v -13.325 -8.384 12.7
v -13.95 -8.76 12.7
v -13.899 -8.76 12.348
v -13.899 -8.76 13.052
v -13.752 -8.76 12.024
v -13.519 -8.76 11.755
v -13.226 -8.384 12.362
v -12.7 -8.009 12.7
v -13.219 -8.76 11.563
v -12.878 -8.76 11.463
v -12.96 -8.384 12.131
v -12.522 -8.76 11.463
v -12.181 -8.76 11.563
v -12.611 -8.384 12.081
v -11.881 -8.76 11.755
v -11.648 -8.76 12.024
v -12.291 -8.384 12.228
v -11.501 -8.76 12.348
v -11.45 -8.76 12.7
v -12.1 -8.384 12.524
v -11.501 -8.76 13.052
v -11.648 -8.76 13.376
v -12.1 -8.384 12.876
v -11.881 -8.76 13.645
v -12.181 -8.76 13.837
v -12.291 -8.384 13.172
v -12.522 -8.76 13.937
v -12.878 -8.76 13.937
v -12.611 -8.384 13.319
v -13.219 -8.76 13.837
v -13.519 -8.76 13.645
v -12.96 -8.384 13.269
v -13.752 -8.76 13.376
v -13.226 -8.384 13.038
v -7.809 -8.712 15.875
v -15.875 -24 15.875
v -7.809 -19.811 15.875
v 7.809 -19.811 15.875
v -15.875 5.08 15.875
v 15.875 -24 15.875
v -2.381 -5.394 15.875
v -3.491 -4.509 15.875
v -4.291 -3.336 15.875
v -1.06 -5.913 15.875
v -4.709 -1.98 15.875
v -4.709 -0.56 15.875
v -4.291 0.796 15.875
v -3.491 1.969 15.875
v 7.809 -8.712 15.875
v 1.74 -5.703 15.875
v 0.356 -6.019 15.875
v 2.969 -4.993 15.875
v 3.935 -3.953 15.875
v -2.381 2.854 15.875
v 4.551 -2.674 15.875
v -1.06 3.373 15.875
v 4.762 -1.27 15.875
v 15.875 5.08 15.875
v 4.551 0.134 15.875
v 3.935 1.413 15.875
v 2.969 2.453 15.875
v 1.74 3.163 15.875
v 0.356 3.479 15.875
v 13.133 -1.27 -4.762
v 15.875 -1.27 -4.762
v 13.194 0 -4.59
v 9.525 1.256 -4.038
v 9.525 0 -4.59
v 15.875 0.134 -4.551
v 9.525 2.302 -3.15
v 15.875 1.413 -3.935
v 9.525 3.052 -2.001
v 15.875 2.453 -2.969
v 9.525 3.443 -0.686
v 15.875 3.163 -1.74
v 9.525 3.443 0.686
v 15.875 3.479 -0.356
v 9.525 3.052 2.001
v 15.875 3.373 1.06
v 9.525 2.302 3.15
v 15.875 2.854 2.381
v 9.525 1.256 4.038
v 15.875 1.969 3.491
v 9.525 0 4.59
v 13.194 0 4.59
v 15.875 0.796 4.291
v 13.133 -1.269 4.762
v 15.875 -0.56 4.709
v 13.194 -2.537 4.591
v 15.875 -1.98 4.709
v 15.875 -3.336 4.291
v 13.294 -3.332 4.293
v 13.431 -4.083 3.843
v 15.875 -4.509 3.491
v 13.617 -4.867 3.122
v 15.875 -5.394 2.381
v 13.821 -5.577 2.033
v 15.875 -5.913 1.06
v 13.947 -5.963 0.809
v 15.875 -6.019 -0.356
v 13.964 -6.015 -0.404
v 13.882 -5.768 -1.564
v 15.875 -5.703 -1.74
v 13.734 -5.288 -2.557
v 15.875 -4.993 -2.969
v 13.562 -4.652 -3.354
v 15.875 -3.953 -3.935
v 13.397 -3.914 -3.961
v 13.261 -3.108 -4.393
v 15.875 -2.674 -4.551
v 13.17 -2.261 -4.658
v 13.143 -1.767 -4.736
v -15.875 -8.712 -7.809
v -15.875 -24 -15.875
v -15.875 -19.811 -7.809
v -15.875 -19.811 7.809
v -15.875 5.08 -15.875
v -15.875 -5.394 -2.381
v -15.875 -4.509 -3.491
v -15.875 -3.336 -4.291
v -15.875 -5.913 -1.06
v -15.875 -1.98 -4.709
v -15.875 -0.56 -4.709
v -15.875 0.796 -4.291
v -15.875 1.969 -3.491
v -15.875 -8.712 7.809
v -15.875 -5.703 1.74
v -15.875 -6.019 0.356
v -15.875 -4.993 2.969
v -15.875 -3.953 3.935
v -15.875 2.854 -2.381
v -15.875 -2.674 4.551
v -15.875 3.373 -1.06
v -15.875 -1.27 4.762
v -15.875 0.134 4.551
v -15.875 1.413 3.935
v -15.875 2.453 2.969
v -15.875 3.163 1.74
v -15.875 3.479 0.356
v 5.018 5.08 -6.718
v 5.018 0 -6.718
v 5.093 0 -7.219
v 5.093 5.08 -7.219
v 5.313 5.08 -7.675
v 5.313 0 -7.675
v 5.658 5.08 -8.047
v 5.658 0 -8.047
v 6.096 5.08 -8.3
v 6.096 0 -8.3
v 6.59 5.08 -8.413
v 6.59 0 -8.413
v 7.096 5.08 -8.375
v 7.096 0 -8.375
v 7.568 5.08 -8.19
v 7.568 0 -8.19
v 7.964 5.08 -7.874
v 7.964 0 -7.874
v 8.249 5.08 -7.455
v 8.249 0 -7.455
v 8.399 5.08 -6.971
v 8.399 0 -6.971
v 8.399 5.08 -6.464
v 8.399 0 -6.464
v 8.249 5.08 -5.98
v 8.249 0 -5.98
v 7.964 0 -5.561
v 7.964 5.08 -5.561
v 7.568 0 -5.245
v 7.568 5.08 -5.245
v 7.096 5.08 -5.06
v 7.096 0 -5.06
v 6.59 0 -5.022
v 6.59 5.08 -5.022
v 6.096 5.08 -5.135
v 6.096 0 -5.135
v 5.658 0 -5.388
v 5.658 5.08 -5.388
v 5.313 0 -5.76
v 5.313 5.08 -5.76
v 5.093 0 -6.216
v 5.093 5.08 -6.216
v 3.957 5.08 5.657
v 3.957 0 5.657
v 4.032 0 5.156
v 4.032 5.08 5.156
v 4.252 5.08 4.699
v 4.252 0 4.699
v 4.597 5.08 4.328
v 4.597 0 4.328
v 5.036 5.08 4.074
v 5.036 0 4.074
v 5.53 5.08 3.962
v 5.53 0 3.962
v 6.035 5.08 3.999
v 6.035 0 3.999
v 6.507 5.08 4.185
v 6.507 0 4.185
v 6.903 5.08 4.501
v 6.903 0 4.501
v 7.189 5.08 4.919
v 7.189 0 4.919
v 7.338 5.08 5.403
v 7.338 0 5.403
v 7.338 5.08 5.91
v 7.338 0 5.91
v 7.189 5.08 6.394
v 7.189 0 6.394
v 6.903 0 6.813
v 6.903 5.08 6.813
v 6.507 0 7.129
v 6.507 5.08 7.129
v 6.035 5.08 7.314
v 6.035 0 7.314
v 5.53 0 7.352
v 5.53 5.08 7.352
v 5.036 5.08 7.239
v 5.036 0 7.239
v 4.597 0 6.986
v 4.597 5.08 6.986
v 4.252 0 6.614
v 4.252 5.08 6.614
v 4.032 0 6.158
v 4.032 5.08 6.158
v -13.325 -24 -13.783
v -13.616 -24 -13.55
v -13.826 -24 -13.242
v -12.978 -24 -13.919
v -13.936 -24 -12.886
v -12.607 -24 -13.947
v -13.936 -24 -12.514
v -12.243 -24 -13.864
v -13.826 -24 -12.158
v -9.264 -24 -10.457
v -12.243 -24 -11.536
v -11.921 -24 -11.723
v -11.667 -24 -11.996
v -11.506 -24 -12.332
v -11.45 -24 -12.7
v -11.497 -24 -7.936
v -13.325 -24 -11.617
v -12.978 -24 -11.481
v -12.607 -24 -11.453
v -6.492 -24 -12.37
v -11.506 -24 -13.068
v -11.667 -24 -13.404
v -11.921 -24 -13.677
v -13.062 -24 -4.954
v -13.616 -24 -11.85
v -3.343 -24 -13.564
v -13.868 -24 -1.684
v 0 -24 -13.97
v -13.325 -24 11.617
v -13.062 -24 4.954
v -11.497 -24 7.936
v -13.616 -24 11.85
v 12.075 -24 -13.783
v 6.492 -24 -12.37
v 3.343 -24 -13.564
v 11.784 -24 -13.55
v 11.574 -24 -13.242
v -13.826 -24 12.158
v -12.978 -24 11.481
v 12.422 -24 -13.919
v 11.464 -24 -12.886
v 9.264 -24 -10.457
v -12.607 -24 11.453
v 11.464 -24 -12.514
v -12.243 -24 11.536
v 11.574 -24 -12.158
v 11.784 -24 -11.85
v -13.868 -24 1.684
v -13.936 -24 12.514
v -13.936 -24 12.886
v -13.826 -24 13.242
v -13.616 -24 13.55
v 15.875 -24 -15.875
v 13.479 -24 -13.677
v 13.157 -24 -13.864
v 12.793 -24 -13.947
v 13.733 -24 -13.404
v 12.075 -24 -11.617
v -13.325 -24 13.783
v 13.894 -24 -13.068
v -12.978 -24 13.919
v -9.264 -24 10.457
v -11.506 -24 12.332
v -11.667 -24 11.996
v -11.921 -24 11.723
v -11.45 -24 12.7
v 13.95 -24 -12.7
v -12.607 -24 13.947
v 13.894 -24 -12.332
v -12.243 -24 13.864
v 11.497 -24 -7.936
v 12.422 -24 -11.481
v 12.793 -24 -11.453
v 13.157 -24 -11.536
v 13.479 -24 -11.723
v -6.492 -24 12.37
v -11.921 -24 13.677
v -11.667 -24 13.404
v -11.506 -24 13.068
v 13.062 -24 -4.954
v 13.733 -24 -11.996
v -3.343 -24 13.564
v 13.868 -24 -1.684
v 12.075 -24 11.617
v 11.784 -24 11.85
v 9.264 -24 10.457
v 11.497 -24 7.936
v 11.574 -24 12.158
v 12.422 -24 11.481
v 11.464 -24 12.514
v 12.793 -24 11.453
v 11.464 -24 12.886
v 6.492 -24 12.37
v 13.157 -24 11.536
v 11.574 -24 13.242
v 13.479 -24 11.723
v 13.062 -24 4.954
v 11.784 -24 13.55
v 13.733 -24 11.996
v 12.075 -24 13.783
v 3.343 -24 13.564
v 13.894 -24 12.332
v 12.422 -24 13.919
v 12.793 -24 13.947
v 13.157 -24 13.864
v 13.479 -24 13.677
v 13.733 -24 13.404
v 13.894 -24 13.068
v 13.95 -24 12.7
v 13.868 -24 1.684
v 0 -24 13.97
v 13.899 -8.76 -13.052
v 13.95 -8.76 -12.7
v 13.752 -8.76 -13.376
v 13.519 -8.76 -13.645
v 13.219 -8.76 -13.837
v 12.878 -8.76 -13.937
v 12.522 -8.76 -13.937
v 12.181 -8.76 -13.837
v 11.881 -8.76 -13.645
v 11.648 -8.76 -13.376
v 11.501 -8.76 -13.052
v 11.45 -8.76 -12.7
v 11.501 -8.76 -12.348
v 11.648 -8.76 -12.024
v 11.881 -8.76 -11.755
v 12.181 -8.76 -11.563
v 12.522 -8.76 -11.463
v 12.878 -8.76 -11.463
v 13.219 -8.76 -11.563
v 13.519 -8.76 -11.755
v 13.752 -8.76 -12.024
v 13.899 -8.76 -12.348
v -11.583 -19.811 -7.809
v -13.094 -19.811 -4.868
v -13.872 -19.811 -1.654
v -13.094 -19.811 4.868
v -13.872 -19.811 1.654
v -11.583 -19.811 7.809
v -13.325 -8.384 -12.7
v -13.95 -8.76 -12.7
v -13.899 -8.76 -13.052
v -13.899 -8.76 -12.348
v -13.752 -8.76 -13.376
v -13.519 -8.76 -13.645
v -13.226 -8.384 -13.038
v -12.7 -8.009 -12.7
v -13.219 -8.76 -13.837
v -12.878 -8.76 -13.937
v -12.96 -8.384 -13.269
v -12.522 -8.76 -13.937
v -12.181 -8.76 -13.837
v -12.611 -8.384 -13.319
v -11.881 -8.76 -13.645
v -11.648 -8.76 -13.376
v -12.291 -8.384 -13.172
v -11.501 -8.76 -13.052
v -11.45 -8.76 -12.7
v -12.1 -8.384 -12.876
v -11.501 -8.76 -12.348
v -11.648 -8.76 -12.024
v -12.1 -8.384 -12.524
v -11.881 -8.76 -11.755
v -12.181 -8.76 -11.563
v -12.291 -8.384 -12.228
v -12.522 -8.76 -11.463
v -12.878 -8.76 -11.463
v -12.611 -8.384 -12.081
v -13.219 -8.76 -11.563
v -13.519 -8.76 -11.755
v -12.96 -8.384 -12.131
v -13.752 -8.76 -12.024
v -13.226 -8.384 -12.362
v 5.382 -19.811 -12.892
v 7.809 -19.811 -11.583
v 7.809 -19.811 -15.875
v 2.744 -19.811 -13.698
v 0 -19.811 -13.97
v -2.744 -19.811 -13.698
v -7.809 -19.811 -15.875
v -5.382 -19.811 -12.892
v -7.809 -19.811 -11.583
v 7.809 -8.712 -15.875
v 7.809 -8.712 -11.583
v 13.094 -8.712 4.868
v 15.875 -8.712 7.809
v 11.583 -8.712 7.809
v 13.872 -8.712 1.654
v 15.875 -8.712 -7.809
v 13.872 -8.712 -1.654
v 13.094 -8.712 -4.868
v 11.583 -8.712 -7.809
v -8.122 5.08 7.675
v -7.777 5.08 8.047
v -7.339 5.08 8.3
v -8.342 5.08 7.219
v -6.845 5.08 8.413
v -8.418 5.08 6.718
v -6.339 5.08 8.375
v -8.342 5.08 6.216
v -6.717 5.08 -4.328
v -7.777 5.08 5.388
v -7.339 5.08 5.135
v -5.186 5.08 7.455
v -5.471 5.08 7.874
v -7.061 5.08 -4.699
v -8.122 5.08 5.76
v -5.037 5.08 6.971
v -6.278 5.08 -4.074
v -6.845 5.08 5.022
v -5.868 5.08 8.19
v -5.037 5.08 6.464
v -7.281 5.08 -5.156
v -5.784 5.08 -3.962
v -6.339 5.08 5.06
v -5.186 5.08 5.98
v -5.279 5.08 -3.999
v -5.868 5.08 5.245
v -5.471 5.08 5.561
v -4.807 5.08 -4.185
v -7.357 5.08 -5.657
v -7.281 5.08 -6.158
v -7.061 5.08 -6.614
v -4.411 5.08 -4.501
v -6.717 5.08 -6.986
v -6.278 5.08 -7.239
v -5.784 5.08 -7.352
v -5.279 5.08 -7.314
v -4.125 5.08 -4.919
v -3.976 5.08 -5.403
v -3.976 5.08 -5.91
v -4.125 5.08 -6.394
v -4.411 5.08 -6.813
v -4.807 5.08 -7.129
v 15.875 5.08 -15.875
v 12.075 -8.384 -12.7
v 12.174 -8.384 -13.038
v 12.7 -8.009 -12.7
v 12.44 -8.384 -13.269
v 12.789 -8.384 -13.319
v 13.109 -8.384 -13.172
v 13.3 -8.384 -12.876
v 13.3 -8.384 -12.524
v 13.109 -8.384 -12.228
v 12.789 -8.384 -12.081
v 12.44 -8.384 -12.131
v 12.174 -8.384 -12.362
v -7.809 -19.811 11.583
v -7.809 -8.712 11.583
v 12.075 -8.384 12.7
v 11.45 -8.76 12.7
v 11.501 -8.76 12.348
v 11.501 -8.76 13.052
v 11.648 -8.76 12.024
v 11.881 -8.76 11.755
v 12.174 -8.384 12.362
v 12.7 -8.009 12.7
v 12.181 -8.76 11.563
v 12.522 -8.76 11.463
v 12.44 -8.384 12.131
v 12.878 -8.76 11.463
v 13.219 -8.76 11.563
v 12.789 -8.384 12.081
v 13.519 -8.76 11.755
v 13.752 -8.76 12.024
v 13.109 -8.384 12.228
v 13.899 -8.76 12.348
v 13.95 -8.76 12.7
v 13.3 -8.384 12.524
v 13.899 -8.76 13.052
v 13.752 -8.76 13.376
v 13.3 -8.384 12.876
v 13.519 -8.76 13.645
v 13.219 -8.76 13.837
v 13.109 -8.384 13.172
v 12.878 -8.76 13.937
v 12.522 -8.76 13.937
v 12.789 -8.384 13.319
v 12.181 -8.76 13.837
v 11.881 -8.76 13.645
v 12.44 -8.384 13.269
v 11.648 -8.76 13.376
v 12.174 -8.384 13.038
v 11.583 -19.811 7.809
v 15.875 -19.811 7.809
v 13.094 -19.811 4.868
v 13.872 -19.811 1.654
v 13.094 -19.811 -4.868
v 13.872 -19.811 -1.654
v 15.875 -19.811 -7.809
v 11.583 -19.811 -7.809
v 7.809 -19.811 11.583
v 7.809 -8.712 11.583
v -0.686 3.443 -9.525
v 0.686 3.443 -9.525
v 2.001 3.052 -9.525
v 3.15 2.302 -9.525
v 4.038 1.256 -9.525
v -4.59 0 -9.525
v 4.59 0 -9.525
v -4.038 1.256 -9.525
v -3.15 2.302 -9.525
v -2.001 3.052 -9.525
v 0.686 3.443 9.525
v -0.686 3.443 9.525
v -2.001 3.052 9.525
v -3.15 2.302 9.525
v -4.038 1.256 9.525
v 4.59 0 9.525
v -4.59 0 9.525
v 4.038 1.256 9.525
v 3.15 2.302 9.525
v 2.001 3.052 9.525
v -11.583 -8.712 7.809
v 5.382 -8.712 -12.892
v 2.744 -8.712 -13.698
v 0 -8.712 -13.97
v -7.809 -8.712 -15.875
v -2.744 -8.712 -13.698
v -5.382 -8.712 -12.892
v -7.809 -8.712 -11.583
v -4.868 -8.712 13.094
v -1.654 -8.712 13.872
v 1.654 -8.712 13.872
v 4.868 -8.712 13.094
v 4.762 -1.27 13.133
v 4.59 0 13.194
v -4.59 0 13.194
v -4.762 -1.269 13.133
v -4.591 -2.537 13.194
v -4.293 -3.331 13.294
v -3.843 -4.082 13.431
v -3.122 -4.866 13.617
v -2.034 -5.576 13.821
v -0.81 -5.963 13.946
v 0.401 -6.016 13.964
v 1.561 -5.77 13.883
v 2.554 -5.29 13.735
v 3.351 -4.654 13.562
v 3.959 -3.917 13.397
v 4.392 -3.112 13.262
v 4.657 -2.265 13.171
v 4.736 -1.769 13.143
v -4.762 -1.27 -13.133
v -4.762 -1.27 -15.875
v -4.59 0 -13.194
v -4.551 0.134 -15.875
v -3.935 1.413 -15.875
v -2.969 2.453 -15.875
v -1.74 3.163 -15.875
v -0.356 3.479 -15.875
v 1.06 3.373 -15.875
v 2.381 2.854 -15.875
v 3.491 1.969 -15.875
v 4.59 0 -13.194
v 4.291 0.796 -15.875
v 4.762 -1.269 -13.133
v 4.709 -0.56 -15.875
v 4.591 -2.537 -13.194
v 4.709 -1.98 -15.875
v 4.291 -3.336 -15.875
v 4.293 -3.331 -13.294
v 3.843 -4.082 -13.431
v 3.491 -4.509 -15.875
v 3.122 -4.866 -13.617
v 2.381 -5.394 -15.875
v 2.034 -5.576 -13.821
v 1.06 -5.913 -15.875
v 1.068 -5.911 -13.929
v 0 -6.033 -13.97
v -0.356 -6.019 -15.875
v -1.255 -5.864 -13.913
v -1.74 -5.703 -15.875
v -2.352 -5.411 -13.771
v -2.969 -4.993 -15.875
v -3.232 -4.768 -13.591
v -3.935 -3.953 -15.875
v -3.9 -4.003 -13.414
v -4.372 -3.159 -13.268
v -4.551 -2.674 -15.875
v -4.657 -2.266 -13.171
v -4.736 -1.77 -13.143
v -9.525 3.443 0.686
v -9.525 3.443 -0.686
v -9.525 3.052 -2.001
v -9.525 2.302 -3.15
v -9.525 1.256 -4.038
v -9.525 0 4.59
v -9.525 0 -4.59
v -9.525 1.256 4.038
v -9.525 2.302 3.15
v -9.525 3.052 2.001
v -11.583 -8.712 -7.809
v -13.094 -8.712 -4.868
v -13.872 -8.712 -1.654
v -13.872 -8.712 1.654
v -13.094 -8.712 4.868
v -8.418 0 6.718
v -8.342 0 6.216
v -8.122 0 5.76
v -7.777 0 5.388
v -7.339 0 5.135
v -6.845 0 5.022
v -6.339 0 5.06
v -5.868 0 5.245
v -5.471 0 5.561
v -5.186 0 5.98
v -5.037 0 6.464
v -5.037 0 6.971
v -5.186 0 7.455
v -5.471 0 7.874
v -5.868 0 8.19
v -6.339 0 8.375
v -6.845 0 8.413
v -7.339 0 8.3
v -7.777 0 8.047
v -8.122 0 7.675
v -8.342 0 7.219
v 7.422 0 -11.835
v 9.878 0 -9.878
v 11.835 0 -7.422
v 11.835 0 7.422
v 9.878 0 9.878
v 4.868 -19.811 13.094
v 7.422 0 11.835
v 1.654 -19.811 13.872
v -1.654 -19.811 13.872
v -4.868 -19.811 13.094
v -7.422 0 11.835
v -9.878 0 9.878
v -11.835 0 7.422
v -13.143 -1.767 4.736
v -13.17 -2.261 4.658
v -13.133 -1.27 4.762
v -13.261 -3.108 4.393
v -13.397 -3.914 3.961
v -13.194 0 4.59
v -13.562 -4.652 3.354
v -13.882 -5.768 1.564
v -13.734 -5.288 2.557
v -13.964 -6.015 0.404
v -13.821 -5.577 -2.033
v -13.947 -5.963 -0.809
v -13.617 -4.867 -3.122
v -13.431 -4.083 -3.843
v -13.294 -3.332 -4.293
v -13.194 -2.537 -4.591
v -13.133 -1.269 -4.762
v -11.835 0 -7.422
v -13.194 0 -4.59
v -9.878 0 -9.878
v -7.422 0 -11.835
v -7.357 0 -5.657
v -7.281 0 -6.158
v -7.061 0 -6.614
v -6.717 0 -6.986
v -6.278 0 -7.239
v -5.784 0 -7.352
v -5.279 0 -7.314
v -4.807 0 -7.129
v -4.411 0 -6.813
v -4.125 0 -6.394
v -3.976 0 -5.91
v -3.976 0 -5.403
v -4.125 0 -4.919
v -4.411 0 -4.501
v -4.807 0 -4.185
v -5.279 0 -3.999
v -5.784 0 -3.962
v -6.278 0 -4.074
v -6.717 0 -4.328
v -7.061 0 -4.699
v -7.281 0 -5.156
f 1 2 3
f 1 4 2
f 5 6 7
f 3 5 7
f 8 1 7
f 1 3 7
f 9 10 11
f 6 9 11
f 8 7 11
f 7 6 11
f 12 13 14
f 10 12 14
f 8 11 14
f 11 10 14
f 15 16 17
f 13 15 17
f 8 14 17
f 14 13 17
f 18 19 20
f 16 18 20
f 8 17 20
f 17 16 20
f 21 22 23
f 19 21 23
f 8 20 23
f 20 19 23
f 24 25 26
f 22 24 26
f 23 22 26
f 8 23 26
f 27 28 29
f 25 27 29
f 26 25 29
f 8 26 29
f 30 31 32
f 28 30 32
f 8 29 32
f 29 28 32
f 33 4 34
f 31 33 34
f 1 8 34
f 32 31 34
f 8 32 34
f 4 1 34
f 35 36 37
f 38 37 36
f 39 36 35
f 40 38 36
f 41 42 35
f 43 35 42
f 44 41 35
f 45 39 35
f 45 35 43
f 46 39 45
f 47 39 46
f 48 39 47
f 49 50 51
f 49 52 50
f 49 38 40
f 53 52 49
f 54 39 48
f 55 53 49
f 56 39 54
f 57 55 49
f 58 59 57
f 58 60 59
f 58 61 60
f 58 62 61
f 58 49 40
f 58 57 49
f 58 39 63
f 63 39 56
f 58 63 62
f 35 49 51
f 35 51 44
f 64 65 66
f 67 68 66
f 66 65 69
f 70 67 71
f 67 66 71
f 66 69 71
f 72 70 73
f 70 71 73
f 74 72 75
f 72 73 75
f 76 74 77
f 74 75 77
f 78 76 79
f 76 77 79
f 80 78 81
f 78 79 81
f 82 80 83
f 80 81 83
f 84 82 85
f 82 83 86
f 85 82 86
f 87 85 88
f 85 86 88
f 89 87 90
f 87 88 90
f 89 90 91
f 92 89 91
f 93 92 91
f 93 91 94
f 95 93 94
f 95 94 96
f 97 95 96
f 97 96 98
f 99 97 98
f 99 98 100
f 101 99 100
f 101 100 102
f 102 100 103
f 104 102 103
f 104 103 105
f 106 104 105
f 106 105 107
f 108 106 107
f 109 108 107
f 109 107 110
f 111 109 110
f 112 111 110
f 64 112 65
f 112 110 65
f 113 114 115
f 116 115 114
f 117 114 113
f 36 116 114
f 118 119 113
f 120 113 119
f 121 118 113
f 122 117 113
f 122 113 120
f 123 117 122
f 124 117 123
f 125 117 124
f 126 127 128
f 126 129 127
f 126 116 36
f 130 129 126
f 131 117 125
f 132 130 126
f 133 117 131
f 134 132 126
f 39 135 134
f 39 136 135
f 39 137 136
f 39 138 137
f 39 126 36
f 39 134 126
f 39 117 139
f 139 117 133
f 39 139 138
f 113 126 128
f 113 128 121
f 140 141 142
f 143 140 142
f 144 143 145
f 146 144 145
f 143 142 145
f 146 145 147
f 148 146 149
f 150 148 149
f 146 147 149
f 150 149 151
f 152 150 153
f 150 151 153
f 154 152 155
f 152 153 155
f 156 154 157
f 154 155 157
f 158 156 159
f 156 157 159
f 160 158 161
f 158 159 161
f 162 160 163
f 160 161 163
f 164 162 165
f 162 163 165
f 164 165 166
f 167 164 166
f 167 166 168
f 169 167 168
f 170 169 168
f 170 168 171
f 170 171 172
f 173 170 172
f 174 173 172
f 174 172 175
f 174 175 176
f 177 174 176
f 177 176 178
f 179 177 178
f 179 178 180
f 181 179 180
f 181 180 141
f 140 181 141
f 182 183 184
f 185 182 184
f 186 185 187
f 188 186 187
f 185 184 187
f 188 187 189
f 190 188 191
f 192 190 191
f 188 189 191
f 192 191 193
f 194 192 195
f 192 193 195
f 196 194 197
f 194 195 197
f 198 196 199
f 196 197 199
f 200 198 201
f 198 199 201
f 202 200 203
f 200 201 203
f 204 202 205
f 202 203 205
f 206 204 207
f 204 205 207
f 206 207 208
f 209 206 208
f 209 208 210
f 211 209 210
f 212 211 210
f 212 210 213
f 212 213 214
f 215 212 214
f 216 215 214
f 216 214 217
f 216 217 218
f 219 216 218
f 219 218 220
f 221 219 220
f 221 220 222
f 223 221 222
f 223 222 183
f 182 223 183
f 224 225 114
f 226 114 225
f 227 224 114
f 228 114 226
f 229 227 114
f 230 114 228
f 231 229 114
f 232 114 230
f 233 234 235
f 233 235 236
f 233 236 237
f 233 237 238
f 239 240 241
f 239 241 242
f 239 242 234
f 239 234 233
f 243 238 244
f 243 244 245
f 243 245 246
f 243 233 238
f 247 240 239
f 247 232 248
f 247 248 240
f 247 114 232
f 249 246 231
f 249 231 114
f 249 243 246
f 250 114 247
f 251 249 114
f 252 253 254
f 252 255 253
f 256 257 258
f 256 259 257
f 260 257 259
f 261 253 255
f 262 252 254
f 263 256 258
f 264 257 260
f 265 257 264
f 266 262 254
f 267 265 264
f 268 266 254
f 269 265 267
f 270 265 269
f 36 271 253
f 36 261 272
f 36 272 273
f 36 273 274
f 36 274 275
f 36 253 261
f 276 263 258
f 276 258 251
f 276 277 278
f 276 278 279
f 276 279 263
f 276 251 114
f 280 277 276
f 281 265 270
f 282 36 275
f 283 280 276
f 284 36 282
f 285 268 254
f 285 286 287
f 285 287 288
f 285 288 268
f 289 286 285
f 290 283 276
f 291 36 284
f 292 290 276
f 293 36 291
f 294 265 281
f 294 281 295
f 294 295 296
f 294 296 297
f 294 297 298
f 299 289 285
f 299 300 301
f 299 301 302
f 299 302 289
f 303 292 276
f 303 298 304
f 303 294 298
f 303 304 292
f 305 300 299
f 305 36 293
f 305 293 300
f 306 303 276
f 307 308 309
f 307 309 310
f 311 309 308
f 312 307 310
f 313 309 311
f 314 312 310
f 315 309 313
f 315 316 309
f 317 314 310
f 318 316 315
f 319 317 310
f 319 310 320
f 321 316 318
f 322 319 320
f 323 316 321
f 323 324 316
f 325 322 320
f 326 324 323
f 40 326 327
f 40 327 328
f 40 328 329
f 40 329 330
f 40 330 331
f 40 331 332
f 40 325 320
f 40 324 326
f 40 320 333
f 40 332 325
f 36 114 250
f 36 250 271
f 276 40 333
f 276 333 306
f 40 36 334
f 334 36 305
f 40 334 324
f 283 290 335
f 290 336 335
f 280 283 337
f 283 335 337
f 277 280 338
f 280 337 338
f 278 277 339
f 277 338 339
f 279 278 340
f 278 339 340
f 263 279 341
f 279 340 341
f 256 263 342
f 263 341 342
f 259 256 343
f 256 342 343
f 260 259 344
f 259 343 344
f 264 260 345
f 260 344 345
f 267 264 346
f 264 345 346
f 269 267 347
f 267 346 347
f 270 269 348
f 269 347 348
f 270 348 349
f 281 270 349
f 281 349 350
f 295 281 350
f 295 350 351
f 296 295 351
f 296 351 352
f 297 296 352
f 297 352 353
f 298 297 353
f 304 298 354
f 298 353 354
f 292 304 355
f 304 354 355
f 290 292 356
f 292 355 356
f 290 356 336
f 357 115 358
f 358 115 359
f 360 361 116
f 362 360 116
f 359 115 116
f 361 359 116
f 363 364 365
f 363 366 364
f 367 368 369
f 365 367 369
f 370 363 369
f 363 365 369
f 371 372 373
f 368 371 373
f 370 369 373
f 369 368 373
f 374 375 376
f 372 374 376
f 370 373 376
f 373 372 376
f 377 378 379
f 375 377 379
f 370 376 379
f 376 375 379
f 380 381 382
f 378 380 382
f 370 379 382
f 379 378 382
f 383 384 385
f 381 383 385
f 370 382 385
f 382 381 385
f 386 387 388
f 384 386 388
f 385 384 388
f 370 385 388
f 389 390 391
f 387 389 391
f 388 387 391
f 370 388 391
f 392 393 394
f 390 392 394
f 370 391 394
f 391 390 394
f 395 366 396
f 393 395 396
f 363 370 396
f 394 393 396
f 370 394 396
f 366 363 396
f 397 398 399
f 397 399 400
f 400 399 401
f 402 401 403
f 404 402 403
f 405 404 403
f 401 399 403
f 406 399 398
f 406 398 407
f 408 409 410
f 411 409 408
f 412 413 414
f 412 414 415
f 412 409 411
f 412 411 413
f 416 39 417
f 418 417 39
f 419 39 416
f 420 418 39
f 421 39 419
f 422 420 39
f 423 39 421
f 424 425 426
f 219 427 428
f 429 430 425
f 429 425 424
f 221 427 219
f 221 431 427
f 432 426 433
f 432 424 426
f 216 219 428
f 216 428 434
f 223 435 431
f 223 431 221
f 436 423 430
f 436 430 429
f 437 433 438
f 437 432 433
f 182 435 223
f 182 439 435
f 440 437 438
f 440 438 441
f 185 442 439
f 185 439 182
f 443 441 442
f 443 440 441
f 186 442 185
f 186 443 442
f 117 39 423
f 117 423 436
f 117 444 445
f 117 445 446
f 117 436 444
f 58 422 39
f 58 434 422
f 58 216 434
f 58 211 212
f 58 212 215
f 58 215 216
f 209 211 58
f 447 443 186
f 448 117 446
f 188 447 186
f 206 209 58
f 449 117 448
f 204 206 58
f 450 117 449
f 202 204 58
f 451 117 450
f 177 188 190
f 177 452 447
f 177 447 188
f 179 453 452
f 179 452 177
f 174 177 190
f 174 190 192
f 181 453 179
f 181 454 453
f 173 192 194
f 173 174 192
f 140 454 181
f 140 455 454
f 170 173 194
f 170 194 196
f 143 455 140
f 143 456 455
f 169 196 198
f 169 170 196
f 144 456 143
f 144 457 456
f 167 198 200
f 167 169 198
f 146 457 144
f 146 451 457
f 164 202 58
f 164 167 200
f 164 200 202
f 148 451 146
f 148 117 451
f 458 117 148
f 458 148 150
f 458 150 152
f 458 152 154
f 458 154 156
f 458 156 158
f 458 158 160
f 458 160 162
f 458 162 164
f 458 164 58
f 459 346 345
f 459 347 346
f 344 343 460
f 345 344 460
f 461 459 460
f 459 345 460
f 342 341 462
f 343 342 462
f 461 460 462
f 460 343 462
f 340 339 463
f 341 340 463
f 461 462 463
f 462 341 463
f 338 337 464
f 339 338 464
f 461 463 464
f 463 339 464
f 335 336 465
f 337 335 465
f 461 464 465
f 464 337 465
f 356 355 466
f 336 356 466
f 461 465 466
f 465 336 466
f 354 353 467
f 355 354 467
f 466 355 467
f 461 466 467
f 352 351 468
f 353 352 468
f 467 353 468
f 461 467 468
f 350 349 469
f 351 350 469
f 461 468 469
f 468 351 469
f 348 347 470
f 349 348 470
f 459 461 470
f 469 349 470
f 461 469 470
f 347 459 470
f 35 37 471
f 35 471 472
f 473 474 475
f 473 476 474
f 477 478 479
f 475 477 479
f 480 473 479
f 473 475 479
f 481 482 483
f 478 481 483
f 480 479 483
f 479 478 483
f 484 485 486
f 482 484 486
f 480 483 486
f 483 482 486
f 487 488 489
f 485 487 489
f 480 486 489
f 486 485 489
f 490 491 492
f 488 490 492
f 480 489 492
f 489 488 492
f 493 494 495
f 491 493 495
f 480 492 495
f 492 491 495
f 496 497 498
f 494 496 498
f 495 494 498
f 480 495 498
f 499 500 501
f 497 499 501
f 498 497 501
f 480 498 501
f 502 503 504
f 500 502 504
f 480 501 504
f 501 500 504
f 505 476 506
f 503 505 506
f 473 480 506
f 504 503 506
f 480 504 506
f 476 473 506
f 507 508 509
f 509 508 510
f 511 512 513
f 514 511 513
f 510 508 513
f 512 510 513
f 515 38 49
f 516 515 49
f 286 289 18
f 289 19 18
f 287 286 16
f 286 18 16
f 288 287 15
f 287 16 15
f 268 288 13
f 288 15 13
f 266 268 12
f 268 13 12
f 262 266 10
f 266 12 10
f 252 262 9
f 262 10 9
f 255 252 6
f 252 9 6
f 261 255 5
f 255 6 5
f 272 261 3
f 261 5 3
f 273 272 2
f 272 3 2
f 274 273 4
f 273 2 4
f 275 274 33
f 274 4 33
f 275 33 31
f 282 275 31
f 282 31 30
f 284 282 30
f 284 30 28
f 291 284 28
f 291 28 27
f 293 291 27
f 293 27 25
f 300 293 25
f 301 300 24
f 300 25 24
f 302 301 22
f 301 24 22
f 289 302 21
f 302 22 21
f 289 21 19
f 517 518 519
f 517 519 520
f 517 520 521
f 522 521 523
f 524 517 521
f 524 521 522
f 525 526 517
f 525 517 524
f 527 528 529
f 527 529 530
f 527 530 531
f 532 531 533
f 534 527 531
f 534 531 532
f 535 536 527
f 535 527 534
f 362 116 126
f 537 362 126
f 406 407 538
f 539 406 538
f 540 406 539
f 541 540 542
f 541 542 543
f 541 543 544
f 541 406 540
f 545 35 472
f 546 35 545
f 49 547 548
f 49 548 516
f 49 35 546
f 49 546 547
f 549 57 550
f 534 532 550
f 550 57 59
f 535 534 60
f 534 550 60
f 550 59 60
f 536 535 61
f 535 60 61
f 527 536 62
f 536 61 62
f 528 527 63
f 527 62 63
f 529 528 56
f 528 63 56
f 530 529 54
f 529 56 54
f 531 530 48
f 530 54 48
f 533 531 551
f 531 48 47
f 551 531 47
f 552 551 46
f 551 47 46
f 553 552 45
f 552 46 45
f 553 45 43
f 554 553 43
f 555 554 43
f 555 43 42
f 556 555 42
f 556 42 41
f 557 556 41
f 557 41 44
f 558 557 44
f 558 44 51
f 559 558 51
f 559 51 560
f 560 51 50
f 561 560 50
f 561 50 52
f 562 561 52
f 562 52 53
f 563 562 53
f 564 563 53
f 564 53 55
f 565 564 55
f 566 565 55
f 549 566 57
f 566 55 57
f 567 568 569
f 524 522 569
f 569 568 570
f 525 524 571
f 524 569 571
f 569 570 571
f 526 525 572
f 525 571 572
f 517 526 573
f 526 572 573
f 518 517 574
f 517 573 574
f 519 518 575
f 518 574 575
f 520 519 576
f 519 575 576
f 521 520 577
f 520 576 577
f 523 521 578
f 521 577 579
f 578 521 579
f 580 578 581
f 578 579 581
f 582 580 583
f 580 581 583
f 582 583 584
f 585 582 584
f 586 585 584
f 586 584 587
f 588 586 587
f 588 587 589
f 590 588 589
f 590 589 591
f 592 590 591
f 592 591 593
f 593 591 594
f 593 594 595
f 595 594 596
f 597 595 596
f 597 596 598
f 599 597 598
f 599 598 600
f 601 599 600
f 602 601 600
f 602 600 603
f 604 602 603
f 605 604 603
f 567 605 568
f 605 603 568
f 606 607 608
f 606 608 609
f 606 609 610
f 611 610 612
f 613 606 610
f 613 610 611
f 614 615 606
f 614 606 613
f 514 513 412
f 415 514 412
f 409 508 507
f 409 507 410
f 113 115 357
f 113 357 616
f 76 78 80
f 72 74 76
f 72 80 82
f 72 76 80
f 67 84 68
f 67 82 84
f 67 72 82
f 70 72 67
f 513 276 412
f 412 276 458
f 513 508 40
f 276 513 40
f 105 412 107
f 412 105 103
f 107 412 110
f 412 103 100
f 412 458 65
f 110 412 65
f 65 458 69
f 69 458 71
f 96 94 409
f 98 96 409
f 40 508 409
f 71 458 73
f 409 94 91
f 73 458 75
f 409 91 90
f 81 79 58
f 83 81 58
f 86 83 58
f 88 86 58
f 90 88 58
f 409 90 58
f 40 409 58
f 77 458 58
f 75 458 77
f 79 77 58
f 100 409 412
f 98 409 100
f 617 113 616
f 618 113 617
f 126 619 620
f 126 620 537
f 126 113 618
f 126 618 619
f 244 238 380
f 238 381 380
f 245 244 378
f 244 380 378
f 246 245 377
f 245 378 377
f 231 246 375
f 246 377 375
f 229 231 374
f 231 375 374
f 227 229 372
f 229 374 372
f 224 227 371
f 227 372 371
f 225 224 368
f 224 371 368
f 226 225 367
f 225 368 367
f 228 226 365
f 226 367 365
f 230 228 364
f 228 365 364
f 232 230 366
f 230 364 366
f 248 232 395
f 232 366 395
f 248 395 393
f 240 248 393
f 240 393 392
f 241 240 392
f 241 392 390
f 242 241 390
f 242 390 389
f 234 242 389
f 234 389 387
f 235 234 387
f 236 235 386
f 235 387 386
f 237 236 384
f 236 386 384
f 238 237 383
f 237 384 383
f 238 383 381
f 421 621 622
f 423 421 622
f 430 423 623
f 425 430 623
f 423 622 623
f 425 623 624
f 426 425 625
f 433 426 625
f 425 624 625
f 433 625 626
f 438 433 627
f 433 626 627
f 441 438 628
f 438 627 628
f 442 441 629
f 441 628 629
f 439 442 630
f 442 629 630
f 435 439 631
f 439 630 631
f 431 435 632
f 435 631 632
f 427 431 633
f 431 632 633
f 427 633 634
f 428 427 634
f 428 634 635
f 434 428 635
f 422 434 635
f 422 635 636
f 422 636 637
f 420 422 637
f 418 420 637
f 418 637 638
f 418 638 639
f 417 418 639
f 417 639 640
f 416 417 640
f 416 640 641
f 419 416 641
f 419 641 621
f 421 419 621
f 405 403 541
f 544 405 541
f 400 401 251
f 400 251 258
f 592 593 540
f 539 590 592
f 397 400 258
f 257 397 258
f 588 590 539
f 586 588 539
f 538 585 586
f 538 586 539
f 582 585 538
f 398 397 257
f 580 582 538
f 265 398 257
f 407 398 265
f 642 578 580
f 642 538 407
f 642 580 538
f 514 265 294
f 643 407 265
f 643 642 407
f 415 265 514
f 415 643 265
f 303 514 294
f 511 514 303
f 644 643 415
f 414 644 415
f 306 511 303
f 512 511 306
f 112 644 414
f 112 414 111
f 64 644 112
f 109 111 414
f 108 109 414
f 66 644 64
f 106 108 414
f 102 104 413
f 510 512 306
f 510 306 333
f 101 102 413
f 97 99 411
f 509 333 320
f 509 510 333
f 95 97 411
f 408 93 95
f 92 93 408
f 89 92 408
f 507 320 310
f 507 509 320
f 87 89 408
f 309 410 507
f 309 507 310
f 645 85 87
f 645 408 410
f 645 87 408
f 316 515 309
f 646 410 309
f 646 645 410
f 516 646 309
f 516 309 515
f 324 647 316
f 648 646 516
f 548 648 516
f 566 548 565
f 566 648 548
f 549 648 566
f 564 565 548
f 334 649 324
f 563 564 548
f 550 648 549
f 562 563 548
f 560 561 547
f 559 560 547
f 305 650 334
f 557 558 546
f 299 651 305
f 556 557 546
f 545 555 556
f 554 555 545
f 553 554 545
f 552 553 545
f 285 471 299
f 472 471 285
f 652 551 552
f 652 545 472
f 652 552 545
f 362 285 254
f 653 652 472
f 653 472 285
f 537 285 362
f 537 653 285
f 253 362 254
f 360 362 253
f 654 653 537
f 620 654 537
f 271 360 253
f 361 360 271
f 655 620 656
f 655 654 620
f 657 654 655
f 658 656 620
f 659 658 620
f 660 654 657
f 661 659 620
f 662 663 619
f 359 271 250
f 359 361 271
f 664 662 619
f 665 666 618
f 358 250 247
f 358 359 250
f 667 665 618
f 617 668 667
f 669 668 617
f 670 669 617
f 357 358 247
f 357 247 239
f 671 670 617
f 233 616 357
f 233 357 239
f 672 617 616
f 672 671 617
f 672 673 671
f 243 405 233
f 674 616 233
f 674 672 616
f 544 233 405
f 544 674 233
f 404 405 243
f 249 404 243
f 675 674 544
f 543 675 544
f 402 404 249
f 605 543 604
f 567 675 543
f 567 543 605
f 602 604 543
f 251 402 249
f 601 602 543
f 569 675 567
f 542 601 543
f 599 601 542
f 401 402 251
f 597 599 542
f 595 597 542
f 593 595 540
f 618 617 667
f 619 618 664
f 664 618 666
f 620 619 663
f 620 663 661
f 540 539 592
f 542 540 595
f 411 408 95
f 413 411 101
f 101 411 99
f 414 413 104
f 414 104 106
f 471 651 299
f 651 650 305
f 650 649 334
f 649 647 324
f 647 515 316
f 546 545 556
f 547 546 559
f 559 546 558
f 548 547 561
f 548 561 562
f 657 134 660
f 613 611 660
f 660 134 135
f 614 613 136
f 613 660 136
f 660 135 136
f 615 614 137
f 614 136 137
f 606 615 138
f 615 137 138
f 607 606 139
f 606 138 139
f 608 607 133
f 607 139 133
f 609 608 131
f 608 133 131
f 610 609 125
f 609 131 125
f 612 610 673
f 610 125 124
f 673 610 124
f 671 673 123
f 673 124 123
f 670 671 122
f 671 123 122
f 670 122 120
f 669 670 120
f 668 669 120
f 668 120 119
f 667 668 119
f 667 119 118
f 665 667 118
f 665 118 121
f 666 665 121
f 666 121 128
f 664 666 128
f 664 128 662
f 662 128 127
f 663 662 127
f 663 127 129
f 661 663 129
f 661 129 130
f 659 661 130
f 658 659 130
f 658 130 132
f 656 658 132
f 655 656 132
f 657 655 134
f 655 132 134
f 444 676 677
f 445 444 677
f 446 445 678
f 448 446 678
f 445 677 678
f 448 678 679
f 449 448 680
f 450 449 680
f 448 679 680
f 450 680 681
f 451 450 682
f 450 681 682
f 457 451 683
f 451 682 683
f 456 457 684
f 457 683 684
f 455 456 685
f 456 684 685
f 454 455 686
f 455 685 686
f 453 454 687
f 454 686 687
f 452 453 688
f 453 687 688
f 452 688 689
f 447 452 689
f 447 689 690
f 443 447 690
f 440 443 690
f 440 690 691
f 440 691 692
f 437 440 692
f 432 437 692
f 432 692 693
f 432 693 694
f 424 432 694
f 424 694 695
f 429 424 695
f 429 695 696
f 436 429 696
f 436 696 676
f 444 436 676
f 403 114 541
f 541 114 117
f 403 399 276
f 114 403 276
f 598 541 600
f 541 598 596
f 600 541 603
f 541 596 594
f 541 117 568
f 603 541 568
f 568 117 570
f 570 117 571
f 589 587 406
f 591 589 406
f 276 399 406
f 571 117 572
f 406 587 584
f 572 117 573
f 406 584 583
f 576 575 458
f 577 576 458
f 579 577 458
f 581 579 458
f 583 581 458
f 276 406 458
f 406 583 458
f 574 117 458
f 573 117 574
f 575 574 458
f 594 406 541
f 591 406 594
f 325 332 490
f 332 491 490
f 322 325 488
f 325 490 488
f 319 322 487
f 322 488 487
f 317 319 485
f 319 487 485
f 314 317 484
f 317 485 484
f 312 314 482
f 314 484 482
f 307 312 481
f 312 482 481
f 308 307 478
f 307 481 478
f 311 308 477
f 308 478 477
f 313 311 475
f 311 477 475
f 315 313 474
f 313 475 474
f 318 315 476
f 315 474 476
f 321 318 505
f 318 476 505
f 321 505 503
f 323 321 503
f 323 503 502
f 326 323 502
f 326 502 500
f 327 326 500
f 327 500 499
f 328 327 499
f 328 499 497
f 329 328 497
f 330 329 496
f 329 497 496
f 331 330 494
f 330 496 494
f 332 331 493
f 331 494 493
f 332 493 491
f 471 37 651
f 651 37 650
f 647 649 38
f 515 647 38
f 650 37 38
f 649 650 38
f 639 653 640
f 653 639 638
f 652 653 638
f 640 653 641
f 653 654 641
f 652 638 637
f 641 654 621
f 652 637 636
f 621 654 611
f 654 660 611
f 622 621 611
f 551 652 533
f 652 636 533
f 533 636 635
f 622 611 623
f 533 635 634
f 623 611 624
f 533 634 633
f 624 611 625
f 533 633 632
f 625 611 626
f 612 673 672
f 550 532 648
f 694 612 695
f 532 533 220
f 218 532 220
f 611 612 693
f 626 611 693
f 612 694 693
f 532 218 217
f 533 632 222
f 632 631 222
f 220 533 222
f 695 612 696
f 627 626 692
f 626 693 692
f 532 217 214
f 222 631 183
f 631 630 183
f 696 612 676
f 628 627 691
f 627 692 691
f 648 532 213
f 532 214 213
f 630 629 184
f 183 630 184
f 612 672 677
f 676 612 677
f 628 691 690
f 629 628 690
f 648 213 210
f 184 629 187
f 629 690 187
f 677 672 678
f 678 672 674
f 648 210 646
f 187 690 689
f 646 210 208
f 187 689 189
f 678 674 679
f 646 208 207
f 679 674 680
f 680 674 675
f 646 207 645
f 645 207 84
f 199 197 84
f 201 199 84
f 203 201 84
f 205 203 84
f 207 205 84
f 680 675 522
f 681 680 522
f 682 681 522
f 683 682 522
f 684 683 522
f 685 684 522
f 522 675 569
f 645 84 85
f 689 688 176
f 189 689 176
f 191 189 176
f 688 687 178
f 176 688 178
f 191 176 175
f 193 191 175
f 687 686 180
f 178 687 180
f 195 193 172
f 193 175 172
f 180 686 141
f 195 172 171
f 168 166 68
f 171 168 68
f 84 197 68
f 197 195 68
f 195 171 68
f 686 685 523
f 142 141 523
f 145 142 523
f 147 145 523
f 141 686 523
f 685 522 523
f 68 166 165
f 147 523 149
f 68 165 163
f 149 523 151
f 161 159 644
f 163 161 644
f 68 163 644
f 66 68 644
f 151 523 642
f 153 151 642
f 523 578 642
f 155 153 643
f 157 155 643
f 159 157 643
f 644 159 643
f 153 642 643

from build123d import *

# Parameters (mm, degrees)
SKETCH1_W                 = 31.75
SKETCH1_H                 = 31.75
BOSS_EXTRUDE1_DEPTH       = 5.08
M3_CLEARANCE_HOLE1_D      = 3.4
M3_CLEARANCE_HOLE1_DEPTH  = 15.24
M3_CLEARANCE_HOLE1_TIP    = 1.021463052
SKETCH7_W                 = 31.75
SKETCH7_H                 = 31.75
SKETCH7_R                 = 13.97
BOSS_EXTRUDE2_DEPTH       = 24
M3X0_5_TAPPED_HOLE1_D     = 2.5
M3X0_5_TAPPED_HOLE1_DEPTH = 15.24
M3X0_5_TAPPED_HOLE1_TIP   = 0.751075774
SKETCH12_R                = 4.7625
CUT_EXTRUDE1_DEPTH        = 6.35
CUT_EXTRUDE2_REACH        = 44.849
CUT_EXTRUDE2_END_RADIUS   = 13.97
SKETCH13_W                = 15.618932536
SKETCH13_H                = 11.098734185
CIRPATTERN1_COUNT         = 4
CIRPATTERN2_COUNT         = 4


with BuildPart() as part:
    # Sketch1 → Boss-Extrude1 (new body)
    with BuildSketch(Plane(origin=(0, 0, 0), x_dir=(1, 0, 0), z_dir=(0, 1, 0))):
        Rectangle(SKETCH1_W, SKETCH1_H)
    extrude(amount=BOSS_EXTRUDE1_DEPTH)

    # M3 Clearance Hole1
    with Locations(Plane(origin=(0, 5.08, 0), x_dir=(1, 0, 0), z_dir=(0, 1, 0))):
        with Locations((-5.656854249, 5.656854249), (6.717514421, 6.717514421), (5.656854249, -5.656854249), (-6.717514421, -6.717514421)):
            Hole(M3_CLEARANCE_HOLE1_D / 2, depth=M3_CLEARANCE_HOLE1_DEPTH)
            with Locations((0, 0, -(M3_CLEARANCE_HOLE1_DEPTH + M3_CLEARANCE_HOLE1_TIP / 2))):  # 118° drill point
                Cone(0, M3_CLEARANCE_HOLE1_D / 2, M3_CLEARANCE_HOLE1_TIP, mode=Mode.SUBTRACT)

    # Sketch7 → Boss-Extrude2 (add)
    with BuildSketch(Plane.XZ):
        Rectangle(SKETCH7_W, SKETCH7_H)
        with Locations(Location((0, 0, 0), (0, 0, 270))):
            Circle(SKETCH7_R, mode=Mode.SUBTRACT)
    extrude(amount=BOSS_EXTRUDE2_DEPTH)

    # M3x0.5 Tapped Hole1
    with Locations(Plane(origin=(0, -24, 0), x_dir=(-1, 0, 0), z_dir=(0, -1, 0))):
        with Locations((-12.7, 12.7), (12.7, 12.7), (12.7, -12.7), (-12.7, -12.7)):
            Hole(M3X0_5_TAPPED_HOLE1_D / 2, depth=M3X0_5_TAPPED_HOLE1_DEPTH)
            with Locations((0, 0, -(M3X0_5_TAPPED_HOLE1_DEPTH + M3X0_5_TAPPED_HOLE1_TIP / 2))):  # 118° drill point
                Cone(0, M3X0_5_TAPPED_HOLE1_D / 2, M3X0_5_TAPPED_HOLE1_TIP, mode=Mode.SUBTRACT)

    # Sketch12 → Cut-Extrude1 (cut)
    with BuildSketch(Plane(origin=(0, 0, -15.875), x_dir=(-1, 0, 0), z_dir=(0, 0, -1))):
        with Locations((0, -1.27)):
            Circle(SKETCH12_R)
    cut_extrude1 = extrude(amount=-CUT_EXTRUDE1_DEPTH, mode=Mode.SUBTRACT)

    # Cut-Extrude2: up to this cylinder (the profile starts outside it)
    cut_extrude2_end = Plane(origin=(0, -14.261548, 0), z_dir=(0, 1, 0)) * Cylinder(CUT_EXTRUDE2_END_RADIUS, 118.638, mode=Mode.PRIVATE)
    # Sketch13 → Cut-Extrude2 (cut, up to the surface)
    with BuildSketch(Plane(origin=(0, 0, -15.875), x_dir=(-1, 0, 0), z_dir=(0, 0, -1)), mode=Mode.PRIVATE) as cut_extrude2_sk1:
        with Locations((0, -14.261548471)):
            Rectangle(SKETCH13_W, SKETCH13_H)
    cut_extrude2_tool1 = extrude(cut_extrude2_sk1.sketch, amount=-CUT_EXTRUDE2_REACH, mode=Mode.PRIVATE) - cut_extrude2_end
    cut_extrude2 = cut_extrude2_tool1.solids().sort_by_distance((0, -14.261548, -15.875))[0]
    add(cut_extrude2, mode=Mode.SUBTRACT)

    # CirPattern1: Cut-Extrude2 ×4 about axis
    cirpattern1_axis = Axis((0, 0, 0), (0, 1, 0))
    for i in range(1, CIRPATTERN1_COUNT):
        add(cut_extrude2.rotate(cirpattern1_axis, i * 360 / CIRPATTERN1_COUNT), mode=Mode.SUBTRACT)

    # CirPattern2: Cut-Extrude1 ×4 about axis
    cirpattern2_axis = Axis((0, 0, 0), (0, 1, 0))
    for i in range(1, CIRPATTERN2_COUNT):
        add(cut_extrude1.rotate(cirpattern2_axis, i * 360 / CIRPATTERN2_COUNT), mode=Mode.SUBTRACT)


solid = part.part
